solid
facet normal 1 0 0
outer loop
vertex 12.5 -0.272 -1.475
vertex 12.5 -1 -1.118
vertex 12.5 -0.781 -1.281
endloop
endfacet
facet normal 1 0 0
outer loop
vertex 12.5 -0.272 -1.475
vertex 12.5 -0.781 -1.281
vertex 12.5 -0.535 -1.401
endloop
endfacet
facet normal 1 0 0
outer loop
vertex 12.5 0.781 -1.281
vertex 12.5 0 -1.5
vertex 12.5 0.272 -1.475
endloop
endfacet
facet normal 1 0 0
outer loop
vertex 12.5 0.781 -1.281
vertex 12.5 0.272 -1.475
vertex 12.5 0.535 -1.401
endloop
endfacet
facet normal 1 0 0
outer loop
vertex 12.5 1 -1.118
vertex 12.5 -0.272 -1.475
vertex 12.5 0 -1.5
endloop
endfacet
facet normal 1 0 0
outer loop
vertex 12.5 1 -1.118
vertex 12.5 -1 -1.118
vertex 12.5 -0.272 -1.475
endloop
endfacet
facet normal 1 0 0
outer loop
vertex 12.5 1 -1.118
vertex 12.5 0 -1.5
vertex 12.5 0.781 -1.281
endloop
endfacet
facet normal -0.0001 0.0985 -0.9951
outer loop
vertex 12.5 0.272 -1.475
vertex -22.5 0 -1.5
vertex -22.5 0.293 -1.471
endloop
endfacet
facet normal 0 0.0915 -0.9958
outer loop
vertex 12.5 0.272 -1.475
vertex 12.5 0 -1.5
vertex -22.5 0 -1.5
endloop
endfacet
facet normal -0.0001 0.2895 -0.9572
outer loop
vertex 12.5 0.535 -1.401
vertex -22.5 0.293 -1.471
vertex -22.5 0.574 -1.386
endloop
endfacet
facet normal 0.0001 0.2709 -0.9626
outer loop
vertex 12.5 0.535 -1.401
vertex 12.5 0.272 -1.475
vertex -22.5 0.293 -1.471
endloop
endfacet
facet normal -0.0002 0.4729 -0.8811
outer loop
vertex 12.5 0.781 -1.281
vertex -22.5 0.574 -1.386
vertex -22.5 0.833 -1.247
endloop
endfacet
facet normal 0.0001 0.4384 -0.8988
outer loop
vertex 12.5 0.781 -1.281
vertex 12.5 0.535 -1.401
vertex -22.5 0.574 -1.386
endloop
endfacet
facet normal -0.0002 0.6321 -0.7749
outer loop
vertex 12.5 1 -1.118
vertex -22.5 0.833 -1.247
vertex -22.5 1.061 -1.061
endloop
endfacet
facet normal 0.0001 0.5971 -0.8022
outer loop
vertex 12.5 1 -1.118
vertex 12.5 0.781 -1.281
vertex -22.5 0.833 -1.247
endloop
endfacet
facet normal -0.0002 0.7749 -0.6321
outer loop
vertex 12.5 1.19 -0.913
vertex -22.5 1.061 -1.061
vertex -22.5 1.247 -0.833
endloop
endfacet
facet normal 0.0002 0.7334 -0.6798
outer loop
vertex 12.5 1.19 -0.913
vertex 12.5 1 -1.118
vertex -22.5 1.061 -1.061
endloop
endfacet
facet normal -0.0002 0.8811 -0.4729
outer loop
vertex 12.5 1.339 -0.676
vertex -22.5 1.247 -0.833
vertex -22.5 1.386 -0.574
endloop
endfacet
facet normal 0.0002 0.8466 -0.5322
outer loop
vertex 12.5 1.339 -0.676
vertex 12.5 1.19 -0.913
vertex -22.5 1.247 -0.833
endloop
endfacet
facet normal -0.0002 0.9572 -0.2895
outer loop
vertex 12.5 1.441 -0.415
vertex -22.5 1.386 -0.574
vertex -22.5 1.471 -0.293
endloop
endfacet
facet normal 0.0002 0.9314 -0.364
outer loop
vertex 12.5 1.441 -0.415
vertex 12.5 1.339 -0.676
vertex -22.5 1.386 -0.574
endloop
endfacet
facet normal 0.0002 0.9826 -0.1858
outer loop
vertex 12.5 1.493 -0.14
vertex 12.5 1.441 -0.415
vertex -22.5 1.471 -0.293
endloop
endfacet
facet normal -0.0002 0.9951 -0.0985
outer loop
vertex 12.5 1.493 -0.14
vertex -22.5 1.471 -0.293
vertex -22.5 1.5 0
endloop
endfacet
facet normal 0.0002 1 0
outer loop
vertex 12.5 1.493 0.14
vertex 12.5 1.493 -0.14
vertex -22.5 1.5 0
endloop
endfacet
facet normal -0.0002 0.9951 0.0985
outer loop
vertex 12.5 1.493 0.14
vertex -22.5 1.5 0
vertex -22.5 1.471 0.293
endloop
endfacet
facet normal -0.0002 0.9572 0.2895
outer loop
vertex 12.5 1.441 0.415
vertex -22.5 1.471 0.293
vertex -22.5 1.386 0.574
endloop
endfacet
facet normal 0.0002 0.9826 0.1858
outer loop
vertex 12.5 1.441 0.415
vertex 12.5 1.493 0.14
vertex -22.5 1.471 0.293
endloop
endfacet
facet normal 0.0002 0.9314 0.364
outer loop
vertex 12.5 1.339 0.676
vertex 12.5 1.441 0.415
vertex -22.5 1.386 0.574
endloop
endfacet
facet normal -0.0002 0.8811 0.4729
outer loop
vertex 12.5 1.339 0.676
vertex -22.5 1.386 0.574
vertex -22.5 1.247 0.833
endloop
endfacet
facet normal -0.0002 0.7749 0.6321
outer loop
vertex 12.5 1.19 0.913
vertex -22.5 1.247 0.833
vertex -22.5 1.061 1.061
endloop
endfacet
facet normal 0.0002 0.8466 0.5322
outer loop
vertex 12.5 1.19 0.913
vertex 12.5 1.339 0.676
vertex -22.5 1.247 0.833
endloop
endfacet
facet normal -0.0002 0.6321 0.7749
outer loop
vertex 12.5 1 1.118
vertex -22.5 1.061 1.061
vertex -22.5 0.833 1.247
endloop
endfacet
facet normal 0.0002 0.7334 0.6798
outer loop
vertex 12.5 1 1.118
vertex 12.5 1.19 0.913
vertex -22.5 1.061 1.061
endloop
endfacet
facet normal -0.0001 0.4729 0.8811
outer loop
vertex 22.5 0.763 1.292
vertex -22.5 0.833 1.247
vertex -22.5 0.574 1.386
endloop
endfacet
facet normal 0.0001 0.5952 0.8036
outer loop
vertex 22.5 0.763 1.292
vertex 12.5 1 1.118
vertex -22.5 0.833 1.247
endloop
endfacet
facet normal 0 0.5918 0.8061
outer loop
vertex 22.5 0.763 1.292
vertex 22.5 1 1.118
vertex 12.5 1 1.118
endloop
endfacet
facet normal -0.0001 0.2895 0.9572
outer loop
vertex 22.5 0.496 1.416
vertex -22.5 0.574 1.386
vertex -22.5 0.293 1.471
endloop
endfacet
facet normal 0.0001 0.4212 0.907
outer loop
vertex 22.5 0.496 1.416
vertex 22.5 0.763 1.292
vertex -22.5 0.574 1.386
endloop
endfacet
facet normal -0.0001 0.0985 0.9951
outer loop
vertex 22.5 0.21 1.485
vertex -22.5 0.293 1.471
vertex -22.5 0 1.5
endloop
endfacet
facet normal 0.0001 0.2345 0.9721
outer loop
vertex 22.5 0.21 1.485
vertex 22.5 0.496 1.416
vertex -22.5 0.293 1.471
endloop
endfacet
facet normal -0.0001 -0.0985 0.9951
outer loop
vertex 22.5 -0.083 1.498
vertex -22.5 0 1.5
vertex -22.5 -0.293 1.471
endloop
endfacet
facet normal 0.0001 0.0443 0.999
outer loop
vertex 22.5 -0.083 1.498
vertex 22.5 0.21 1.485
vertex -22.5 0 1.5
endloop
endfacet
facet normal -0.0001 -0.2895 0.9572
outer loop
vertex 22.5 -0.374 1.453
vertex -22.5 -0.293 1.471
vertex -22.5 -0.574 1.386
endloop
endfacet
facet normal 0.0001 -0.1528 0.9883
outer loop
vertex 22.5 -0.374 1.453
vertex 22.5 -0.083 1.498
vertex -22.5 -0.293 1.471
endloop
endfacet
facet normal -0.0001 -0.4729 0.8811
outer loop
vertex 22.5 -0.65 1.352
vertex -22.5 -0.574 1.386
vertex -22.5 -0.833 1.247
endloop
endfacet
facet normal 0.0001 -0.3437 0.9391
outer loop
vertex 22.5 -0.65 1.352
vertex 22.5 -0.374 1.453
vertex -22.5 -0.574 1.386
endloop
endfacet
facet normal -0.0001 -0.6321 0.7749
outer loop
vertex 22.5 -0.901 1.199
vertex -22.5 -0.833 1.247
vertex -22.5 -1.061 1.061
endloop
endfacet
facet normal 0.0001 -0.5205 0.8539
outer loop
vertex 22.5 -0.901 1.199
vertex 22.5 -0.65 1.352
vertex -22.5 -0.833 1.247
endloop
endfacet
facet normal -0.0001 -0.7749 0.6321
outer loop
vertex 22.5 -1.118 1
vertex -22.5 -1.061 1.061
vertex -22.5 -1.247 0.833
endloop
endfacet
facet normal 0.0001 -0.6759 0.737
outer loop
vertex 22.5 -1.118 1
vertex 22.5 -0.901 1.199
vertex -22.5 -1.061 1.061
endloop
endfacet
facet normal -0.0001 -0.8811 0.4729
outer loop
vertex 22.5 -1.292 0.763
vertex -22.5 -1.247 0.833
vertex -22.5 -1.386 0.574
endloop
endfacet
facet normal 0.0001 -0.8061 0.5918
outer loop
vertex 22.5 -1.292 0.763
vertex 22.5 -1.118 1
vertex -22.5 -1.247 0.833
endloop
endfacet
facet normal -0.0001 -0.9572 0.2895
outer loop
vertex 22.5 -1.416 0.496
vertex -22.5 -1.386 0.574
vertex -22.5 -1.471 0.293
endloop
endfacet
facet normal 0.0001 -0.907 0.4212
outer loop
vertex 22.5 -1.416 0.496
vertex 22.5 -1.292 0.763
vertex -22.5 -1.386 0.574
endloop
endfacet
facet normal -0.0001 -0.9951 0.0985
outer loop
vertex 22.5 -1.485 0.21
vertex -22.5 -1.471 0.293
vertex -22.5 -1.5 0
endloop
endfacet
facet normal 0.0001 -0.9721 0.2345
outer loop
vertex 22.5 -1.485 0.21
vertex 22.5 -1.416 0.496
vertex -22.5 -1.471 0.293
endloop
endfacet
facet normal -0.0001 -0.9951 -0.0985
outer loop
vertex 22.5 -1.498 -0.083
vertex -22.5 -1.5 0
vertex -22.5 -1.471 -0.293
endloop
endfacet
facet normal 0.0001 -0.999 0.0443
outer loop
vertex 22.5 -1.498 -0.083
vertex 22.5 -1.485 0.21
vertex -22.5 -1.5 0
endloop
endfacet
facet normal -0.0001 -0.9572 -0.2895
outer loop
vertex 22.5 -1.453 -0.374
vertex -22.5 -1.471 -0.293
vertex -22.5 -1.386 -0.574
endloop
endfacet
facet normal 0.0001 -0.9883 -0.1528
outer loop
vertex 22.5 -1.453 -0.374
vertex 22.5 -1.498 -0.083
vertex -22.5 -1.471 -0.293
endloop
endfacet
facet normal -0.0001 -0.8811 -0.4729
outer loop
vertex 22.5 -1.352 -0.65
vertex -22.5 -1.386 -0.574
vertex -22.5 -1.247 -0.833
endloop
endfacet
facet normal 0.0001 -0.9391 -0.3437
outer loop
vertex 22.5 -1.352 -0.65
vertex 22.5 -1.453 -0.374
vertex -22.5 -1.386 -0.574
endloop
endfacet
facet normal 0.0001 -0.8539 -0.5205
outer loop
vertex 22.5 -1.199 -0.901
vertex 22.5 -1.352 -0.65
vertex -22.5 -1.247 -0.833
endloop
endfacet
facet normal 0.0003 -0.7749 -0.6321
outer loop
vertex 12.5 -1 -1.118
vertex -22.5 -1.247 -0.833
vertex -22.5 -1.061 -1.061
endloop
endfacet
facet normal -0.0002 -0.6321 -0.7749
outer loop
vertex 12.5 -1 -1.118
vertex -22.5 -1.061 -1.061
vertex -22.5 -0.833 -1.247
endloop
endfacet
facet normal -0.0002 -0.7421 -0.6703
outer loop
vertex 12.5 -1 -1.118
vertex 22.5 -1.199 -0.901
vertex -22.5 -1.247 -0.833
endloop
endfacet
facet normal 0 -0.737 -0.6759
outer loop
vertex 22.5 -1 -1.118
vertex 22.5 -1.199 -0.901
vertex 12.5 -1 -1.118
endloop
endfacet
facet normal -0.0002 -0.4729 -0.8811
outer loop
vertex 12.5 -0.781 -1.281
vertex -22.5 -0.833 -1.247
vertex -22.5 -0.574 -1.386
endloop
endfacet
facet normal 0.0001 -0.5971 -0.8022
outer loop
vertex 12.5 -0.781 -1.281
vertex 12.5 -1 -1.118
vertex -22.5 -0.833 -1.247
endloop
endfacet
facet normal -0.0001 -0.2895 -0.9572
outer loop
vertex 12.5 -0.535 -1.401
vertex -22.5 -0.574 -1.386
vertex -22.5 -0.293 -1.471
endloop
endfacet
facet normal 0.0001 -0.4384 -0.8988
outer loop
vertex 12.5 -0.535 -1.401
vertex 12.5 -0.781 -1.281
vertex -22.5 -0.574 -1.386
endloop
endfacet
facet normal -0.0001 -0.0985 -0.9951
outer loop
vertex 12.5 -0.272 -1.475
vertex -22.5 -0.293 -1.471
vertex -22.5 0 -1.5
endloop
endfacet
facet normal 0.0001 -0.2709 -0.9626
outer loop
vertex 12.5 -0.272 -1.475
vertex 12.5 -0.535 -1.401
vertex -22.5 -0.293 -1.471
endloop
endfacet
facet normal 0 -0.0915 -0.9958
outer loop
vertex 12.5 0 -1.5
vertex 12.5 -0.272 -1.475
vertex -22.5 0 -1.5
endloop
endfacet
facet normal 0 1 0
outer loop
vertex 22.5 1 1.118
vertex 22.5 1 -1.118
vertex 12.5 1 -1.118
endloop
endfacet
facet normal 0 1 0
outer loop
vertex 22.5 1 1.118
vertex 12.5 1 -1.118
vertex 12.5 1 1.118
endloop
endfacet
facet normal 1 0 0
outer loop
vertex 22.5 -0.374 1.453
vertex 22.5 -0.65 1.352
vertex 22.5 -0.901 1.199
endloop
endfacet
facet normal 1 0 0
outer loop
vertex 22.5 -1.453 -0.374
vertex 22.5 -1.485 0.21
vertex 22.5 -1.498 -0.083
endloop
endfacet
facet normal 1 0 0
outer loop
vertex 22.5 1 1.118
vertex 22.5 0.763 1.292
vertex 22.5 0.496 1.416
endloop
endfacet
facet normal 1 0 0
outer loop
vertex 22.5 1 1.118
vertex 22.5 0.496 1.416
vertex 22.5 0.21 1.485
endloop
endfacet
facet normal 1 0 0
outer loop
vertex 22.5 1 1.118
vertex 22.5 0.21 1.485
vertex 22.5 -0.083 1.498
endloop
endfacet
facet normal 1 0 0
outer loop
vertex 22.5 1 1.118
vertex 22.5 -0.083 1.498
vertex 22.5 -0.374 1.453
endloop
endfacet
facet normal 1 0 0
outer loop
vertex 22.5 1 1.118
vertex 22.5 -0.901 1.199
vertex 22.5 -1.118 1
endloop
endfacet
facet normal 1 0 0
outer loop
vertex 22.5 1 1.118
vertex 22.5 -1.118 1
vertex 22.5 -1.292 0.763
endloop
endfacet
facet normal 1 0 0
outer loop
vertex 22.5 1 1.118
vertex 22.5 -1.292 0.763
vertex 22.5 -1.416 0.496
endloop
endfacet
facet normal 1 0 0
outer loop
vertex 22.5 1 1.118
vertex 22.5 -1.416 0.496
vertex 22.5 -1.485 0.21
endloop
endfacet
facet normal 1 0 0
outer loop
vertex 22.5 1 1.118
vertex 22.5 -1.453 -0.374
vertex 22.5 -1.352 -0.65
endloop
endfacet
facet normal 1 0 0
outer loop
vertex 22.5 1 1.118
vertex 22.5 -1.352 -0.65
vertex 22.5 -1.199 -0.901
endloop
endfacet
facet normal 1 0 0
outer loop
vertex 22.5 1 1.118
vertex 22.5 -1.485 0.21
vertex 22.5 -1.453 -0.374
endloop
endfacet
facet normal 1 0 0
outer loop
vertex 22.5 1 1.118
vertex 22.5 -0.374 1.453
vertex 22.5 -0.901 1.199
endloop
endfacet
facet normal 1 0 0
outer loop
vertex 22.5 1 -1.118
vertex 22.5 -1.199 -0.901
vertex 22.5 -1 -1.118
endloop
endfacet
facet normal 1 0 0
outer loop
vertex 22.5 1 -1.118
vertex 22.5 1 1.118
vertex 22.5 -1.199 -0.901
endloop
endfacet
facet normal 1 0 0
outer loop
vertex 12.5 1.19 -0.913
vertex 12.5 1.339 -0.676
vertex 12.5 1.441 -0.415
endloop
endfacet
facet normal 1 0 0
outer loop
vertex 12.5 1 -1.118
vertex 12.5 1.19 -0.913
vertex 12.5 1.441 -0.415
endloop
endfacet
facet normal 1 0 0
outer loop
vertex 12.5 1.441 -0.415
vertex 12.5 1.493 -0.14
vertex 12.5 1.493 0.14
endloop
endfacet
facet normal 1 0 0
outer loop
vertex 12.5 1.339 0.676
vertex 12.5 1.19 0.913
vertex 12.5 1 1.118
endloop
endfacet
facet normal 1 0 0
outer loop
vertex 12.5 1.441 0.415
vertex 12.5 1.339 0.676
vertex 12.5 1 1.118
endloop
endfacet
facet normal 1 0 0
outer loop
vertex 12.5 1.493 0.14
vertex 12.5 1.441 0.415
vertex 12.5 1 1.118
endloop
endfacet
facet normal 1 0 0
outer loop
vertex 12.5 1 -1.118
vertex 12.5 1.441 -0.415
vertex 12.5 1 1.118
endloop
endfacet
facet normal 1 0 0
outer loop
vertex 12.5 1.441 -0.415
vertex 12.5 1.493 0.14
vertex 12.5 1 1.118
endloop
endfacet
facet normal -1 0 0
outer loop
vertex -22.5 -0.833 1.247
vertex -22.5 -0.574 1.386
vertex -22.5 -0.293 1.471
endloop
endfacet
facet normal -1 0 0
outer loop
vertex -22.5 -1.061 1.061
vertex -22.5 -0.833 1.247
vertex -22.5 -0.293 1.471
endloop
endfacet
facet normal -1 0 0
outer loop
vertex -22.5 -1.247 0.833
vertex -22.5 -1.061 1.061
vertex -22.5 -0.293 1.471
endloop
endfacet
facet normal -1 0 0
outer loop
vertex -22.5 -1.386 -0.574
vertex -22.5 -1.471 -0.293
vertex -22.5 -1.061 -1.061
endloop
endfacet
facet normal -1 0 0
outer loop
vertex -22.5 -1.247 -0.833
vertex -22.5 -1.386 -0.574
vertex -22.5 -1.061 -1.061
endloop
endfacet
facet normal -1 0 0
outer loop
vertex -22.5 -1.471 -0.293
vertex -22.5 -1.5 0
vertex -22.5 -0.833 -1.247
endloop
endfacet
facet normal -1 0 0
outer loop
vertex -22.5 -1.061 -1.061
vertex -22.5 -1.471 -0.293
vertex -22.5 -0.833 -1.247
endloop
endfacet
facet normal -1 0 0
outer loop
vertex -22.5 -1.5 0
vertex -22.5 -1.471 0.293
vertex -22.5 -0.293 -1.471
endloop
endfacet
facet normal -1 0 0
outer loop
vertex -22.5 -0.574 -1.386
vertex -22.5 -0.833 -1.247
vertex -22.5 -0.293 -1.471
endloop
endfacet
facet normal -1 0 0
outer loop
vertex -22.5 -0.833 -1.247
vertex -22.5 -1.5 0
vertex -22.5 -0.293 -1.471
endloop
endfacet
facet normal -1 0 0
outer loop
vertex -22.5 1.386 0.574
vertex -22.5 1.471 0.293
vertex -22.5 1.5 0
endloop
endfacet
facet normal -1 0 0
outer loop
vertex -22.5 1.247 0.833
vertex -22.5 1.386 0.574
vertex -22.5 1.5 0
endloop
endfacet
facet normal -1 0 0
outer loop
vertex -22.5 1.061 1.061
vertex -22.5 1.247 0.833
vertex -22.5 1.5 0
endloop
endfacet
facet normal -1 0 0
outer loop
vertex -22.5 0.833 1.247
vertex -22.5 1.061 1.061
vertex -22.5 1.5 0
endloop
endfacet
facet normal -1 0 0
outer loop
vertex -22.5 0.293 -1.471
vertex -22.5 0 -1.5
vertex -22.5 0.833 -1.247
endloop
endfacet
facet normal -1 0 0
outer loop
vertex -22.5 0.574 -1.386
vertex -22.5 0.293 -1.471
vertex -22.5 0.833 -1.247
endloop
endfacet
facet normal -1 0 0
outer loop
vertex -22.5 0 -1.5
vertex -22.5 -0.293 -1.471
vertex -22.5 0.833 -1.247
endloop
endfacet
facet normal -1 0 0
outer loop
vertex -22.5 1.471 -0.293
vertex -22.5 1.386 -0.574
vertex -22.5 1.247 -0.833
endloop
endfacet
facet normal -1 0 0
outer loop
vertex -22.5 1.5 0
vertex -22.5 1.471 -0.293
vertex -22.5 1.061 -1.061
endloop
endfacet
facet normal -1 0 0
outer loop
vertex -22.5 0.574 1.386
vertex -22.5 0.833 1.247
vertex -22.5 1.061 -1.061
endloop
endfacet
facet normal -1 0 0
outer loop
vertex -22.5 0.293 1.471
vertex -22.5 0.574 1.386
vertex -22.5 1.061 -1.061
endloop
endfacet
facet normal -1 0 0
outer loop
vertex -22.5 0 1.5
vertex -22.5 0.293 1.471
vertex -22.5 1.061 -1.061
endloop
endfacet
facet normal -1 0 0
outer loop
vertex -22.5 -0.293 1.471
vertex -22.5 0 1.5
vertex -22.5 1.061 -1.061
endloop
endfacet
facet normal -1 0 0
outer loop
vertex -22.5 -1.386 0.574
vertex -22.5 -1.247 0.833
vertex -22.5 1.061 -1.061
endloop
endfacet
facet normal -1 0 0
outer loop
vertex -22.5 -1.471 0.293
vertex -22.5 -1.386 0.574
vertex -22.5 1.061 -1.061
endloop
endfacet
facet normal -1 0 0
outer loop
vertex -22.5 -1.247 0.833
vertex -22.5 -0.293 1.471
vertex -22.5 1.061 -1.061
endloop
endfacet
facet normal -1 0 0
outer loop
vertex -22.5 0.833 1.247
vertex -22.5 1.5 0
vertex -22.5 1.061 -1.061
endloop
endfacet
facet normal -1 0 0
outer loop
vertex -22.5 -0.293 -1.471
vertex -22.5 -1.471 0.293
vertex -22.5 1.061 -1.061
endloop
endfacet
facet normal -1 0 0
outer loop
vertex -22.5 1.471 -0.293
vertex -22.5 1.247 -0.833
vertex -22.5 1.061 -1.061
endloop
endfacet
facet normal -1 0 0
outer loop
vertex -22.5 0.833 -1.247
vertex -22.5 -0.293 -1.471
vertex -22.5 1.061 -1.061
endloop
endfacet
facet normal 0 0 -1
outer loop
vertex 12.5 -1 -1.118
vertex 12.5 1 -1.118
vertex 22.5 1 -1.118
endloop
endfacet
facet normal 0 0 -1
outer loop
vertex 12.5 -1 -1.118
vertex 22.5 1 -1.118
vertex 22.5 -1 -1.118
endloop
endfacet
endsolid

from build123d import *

# Parameters (mm, degrees)
SKETCH1_R           = 1.5
BOSS_EXTRUDE1_DEPTH = 22.5
CUT_EXTRUDE1_DEPTH  = 10
CUT_EXTRUDE2_DEPTH  = 10


with BuildPart() as part:
    # Sketch1 → Boss-Extrude1 (new body, symmetric)
    with BuildSketch(Plane(origin=(0, 0, 0), x_dir=(0, 0, -1), z_dir=(1, 0, 0))):
        Circle(SKETCH1_R)
    extrude(amount=BOSS_EXTRUDE1_DEPTH, both=True)

    # Sketch2 → Cut-Extrude1 (cut)
    with BuildSketch(Plane(origin=(22.5, 0, 0), x_dir=(0, 0, -1), z_dir=(1, 0, 0))):
        with BuildLine():
            Line((1.118033989, 1), (-1.118033989, 1))
            ThreePointArc((-1.118033989, 1), (0, 1.5), (1.118033989, 1))
        make_face()
    extrude(amount=-CUT_EXTRUDE1_DEPTH, mode=Mode.SUBTRACT)

    # Sketch3 → Cut-Extrude2 (cut)
    with BuildSketch(Plane(origin=(22.5, 0, 0), x_dir=(0, 0, -1), z_dir=(1, 0, 0))):
        with BuildLine():
            Line((1.118033989, 1), (1.118033989, -1))
            ThreePointArc((1.118033989, -1), (1.5, 0), (1.118033989, 1))
        make_face()
    extrude(amount=-CUT_EXTRUDE2_DEPTH, mode=Mode.SUBTRACT)


solid = part.part
